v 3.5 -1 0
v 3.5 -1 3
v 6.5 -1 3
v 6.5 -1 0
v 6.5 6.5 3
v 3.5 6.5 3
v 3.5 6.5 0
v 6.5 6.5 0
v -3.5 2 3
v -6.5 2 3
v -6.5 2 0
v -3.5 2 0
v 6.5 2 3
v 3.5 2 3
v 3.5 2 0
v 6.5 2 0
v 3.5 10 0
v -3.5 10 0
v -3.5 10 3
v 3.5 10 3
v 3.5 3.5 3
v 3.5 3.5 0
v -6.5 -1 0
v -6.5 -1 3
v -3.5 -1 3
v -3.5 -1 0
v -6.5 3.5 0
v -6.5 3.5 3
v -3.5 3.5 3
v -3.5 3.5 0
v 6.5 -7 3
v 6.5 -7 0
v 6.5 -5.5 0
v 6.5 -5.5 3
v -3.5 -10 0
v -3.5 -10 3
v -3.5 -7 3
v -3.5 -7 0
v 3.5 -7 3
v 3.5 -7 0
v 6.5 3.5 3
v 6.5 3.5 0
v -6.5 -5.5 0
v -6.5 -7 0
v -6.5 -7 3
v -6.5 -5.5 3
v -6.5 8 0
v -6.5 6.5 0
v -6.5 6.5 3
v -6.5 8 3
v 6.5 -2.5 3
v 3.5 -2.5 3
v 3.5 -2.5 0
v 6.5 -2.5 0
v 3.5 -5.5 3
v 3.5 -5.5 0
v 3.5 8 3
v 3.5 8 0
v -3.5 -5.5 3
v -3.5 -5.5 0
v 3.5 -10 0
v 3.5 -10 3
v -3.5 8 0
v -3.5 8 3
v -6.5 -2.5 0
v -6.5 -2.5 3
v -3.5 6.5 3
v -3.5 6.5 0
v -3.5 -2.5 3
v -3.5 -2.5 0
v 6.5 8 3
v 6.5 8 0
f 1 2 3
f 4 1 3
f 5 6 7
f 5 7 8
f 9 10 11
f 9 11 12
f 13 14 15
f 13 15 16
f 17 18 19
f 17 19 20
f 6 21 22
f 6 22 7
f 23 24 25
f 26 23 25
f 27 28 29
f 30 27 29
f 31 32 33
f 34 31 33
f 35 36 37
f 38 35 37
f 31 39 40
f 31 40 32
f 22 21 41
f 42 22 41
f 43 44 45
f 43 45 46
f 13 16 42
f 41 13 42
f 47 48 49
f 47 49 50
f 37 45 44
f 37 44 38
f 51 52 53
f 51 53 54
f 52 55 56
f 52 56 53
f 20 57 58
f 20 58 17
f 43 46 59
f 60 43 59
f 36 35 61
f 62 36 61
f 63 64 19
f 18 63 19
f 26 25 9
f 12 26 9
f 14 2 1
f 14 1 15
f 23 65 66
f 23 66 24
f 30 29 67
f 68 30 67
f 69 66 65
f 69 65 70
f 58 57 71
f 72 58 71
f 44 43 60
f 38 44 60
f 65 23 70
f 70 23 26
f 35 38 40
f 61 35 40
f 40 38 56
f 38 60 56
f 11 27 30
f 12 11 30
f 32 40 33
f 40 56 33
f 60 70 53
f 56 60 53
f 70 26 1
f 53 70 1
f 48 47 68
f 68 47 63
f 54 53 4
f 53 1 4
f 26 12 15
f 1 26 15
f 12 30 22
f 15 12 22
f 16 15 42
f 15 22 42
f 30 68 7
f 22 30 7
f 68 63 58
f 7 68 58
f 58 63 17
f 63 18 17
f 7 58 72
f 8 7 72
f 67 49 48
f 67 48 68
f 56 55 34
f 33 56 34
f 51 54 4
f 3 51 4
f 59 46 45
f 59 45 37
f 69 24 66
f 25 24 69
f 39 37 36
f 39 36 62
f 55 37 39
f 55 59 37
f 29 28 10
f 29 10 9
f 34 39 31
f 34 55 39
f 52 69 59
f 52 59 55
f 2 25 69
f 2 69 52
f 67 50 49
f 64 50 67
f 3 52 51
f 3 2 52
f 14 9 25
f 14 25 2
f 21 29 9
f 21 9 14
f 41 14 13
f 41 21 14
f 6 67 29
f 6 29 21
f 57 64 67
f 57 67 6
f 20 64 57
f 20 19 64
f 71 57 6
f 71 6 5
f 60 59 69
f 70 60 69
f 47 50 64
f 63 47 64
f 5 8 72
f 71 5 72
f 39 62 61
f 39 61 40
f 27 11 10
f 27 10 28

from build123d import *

# Parameters (mm, degrees)
SKETCH1_W           = 13
SKETCH1_H           = 20
BOSS_EXTRUDE1_DEPTH = 3
SKETCH2_W           = 3
SKETCH2_H           = 2
SKETCH2_H_2         = 3
CUT_EXTRUDE1_DEPTH  = 3
SKETCH3_W           = 3
SKETCH3_H           = 2
SKETCH3_H_2         = 3
CUT_EXTRUDE2_DEPTH  = 3


with BuildPart() as part:
    # Sketch1 → Boss-Extrude1 (new body)
    with BuildSketch(Plane.XY):
        Rectangle(SKETCH1_W, SKETCH1_H)
    extrude(amount=BOSS_EXTRUDE1_DEPTH)

    # Sketch2 → Cut-Extrude1 (cut)
    with BuildSketch(Plane.XY.offset(3)):
        with Locations((-5, 9)):
            Rectangle(SKETCH2_W, SKETCH2_H)
        with Locations((-5, 5)):
            Rectangle(SKETCH2_W, SKETCH2_H_2)
        with Locations((-5, 0.5)):
            Rectangle(SKETCH2_W, SKETCH2_H_2)
        with Locations((-5, -4)):
            Rectangle(SKETCH2_W, SKETCH2_H_2)
        with Locations((-5, -8.5)):
            Rectangle(SKETCH2_W, SKETCH2_H_2)
    extrude(amount=-CUT_EXTRUDE1_DEPTH, mode=Mode.SUBTRACT)

    # Sketch3 → Cut-Extrude2 (cut)
    with BuildSketch(Plane.XY.offset(3)):
        with Locations((5, 9)):
            Rectangle(SKETCH3_W, SKETCH3_H)
        with Locations((5, 5)):
            Rectangle(SKETCH3_W, SKETCH3_H_2)
        with Locations((5, 0.5)):
            Rectangle(SKETCH3_W, SKETCH3_H_2)
        with Locations((5, -4)):
            Rectangle(SKETCH3_W, SKETCH3_H_2)
        with Locations((5, -8.5)):
            Rectangle(SKETCH3_W, SKETCH3_H_2)
    extrude(amount=-CUT_EXTRUDE2_DEPTH, mode=Mode.SUBTRACT)


solid = part.part
